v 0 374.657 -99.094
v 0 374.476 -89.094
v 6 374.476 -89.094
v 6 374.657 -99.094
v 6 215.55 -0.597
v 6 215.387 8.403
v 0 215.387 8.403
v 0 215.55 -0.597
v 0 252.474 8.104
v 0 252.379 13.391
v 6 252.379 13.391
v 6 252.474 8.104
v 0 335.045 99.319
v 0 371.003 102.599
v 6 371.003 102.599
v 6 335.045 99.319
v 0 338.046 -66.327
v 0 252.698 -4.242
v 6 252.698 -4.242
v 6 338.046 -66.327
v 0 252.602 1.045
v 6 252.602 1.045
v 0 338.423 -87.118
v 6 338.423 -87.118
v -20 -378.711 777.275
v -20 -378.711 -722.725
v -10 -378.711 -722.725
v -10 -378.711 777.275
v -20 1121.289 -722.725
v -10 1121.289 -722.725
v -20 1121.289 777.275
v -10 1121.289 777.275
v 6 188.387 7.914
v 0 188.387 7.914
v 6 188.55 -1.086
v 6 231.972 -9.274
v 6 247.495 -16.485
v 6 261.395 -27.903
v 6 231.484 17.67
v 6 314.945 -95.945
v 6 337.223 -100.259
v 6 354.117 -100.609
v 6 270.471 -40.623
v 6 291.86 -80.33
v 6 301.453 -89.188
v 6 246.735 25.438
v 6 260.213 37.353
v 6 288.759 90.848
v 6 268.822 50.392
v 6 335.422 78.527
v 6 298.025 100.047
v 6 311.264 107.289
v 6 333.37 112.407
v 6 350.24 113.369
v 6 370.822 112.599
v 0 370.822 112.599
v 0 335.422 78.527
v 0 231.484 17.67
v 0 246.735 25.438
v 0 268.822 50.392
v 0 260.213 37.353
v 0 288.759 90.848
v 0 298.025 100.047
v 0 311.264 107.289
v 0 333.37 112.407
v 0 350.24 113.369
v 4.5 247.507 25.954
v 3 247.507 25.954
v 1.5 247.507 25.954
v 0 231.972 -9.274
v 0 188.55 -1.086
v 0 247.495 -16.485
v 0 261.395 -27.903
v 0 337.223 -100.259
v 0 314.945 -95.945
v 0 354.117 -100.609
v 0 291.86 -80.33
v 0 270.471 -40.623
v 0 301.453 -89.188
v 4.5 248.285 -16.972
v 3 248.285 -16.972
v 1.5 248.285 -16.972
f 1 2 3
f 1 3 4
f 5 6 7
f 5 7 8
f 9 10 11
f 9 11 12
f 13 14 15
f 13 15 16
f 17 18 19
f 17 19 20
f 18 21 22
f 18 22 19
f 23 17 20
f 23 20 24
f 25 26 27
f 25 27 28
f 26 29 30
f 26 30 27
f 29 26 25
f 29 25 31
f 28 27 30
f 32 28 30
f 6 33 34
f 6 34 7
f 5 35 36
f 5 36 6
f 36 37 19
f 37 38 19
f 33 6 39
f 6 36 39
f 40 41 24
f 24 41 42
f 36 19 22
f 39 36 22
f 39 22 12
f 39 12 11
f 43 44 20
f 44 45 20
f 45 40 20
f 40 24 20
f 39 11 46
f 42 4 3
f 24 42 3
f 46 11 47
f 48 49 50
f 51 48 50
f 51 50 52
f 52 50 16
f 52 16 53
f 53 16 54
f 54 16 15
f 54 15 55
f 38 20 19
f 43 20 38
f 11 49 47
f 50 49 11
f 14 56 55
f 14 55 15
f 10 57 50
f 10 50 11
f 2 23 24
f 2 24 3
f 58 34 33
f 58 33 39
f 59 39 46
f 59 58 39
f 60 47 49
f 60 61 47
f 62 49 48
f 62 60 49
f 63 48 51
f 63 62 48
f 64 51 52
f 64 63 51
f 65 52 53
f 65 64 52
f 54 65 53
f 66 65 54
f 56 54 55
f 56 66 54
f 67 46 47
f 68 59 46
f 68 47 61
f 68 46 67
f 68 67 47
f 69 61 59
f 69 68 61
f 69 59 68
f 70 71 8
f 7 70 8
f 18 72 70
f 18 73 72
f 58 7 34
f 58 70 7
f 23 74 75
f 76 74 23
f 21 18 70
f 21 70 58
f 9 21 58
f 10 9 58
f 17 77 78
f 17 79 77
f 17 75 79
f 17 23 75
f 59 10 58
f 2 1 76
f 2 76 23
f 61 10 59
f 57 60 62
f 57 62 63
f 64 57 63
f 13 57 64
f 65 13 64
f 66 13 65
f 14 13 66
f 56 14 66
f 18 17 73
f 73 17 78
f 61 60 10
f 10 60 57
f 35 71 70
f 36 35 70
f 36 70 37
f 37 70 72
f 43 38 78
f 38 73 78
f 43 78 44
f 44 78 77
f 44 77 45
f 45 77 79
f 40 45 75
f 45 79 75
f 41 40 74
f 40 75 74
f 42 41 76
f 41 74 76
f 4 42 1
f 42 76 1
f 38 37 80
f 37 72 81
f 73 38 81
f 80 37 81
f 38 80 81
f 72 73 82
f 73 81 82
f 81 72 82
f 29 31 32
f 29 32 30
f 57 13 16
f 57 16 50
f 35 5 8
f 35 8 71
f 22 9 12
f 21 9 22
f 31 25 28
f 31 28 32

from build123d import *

# Parameters (mm, degrees)
BOSS_EXTRU_2_DEPTH      = 10
BOSS_EXTRU_3_DEPTH      = 6
ENL_V_MAT_EXTRU_1_DEPTH = 6


with BuildPart() as part:
    # Esquisse3D1 → Boss.-Extru.2 (new body)
    with BuildSketch(Plane(origin=(-20, 1121.289346724, 777.274991403), x_dir=(0, -0.7071067811865476, -0.7071067811865476), z_dir=(1, 0, 0))):
        Polygon((0, 0), (1060.66017178, 1060.66017178), (2121.32034356, 0), (1060.66017178, -1060.66017178), align=None)
    extrude(amount=BOSS_EXTRU_2_DEPTH)


with BuildPart() as body_2:
    # Esquisse5 → Boss.-Extru.3 (new body)
    with BuildSketch(Plane(origin=(0, 0, 0), x_dir=(0, 0, -1), z_dir=(1, 0, 0))):
        with BuildLine():
            Line((-8.104342583, 252.474437856), (-1.045313335, 252.602314833))
            Line((-1.045313335, 252.602314833), (4.241642527, 252.698090033))
            Line((4.241642527, 252.698090033), (66.327362258, 338.046023845))
            Line((66.327362258, 338.046023845), (87.118425546, 338.4226618))
            Line((87.118425546, 338.4226618), (89.094192112, 374.475874746))
            Line((89.094192112, 374.475874746), (99.094192112, 374.657028519))
            add(Edge.make_bspline(
                [(0, 0), (13.241353905, 145.149025234), (-56.44530803, 383.771712272), (120.215562295, 187.351690566), (99.094192112, 374.657028519)],
                knots=[0, 0, 0, 0, 0, 1, 1, 1, 1, 1], degree=4))
            add(Edge.make_bspline(
                [(0, 0), (-18.489799491, 144.574203419), (42.508495971, 385.564297763), (-126.922352922, 182.874693997), (-112.598828297, 370.822129592)],
                knots=[0, 0, 0, 0, 0, 1, 1, 1, 1, 1], degree=4))
            Line((-112.598828297, 370.822129592), (-102.598828297, 371.003283364))
            Line((-102.598828297, 371.003283364), (-99.318551483, 335.045285627))
            Line((-99.318551483, 335.045285627), (-78.527488195, 335.421923582))
            Line((-78.527488195, 335.421923582), (-13.391298445, 252.378662656))
            Line((-13.391298445, 252.378662656), (-8.104342583, 252.474437856))
        make_face()
    extrude(amount=BOSS_EXTRU_3_DEPTH)

    # Esquisse6 → Enlèv. mat.-Extru.1 (cut)
    with BuildSketch(Plane(origin=(6, 0, 0), x_dir=(0, 0, -1), z_dir=(1, 0, 0))):
        Polygon((-7.914172437, 188.386674922), (-8.403287623, 215.386674922), (0.596712377, 215.549713317), (1.085827563, 188.549713317), (117.063261114, -47.52702125), (-85.227699586, -65.220017949), align=None)
    extrude(amount=-ENL_V_MAT_EXTRU_1_DEPTH, mode=Mode.SUBTRACT)


solid = Compound([part.part, body_2.part])
